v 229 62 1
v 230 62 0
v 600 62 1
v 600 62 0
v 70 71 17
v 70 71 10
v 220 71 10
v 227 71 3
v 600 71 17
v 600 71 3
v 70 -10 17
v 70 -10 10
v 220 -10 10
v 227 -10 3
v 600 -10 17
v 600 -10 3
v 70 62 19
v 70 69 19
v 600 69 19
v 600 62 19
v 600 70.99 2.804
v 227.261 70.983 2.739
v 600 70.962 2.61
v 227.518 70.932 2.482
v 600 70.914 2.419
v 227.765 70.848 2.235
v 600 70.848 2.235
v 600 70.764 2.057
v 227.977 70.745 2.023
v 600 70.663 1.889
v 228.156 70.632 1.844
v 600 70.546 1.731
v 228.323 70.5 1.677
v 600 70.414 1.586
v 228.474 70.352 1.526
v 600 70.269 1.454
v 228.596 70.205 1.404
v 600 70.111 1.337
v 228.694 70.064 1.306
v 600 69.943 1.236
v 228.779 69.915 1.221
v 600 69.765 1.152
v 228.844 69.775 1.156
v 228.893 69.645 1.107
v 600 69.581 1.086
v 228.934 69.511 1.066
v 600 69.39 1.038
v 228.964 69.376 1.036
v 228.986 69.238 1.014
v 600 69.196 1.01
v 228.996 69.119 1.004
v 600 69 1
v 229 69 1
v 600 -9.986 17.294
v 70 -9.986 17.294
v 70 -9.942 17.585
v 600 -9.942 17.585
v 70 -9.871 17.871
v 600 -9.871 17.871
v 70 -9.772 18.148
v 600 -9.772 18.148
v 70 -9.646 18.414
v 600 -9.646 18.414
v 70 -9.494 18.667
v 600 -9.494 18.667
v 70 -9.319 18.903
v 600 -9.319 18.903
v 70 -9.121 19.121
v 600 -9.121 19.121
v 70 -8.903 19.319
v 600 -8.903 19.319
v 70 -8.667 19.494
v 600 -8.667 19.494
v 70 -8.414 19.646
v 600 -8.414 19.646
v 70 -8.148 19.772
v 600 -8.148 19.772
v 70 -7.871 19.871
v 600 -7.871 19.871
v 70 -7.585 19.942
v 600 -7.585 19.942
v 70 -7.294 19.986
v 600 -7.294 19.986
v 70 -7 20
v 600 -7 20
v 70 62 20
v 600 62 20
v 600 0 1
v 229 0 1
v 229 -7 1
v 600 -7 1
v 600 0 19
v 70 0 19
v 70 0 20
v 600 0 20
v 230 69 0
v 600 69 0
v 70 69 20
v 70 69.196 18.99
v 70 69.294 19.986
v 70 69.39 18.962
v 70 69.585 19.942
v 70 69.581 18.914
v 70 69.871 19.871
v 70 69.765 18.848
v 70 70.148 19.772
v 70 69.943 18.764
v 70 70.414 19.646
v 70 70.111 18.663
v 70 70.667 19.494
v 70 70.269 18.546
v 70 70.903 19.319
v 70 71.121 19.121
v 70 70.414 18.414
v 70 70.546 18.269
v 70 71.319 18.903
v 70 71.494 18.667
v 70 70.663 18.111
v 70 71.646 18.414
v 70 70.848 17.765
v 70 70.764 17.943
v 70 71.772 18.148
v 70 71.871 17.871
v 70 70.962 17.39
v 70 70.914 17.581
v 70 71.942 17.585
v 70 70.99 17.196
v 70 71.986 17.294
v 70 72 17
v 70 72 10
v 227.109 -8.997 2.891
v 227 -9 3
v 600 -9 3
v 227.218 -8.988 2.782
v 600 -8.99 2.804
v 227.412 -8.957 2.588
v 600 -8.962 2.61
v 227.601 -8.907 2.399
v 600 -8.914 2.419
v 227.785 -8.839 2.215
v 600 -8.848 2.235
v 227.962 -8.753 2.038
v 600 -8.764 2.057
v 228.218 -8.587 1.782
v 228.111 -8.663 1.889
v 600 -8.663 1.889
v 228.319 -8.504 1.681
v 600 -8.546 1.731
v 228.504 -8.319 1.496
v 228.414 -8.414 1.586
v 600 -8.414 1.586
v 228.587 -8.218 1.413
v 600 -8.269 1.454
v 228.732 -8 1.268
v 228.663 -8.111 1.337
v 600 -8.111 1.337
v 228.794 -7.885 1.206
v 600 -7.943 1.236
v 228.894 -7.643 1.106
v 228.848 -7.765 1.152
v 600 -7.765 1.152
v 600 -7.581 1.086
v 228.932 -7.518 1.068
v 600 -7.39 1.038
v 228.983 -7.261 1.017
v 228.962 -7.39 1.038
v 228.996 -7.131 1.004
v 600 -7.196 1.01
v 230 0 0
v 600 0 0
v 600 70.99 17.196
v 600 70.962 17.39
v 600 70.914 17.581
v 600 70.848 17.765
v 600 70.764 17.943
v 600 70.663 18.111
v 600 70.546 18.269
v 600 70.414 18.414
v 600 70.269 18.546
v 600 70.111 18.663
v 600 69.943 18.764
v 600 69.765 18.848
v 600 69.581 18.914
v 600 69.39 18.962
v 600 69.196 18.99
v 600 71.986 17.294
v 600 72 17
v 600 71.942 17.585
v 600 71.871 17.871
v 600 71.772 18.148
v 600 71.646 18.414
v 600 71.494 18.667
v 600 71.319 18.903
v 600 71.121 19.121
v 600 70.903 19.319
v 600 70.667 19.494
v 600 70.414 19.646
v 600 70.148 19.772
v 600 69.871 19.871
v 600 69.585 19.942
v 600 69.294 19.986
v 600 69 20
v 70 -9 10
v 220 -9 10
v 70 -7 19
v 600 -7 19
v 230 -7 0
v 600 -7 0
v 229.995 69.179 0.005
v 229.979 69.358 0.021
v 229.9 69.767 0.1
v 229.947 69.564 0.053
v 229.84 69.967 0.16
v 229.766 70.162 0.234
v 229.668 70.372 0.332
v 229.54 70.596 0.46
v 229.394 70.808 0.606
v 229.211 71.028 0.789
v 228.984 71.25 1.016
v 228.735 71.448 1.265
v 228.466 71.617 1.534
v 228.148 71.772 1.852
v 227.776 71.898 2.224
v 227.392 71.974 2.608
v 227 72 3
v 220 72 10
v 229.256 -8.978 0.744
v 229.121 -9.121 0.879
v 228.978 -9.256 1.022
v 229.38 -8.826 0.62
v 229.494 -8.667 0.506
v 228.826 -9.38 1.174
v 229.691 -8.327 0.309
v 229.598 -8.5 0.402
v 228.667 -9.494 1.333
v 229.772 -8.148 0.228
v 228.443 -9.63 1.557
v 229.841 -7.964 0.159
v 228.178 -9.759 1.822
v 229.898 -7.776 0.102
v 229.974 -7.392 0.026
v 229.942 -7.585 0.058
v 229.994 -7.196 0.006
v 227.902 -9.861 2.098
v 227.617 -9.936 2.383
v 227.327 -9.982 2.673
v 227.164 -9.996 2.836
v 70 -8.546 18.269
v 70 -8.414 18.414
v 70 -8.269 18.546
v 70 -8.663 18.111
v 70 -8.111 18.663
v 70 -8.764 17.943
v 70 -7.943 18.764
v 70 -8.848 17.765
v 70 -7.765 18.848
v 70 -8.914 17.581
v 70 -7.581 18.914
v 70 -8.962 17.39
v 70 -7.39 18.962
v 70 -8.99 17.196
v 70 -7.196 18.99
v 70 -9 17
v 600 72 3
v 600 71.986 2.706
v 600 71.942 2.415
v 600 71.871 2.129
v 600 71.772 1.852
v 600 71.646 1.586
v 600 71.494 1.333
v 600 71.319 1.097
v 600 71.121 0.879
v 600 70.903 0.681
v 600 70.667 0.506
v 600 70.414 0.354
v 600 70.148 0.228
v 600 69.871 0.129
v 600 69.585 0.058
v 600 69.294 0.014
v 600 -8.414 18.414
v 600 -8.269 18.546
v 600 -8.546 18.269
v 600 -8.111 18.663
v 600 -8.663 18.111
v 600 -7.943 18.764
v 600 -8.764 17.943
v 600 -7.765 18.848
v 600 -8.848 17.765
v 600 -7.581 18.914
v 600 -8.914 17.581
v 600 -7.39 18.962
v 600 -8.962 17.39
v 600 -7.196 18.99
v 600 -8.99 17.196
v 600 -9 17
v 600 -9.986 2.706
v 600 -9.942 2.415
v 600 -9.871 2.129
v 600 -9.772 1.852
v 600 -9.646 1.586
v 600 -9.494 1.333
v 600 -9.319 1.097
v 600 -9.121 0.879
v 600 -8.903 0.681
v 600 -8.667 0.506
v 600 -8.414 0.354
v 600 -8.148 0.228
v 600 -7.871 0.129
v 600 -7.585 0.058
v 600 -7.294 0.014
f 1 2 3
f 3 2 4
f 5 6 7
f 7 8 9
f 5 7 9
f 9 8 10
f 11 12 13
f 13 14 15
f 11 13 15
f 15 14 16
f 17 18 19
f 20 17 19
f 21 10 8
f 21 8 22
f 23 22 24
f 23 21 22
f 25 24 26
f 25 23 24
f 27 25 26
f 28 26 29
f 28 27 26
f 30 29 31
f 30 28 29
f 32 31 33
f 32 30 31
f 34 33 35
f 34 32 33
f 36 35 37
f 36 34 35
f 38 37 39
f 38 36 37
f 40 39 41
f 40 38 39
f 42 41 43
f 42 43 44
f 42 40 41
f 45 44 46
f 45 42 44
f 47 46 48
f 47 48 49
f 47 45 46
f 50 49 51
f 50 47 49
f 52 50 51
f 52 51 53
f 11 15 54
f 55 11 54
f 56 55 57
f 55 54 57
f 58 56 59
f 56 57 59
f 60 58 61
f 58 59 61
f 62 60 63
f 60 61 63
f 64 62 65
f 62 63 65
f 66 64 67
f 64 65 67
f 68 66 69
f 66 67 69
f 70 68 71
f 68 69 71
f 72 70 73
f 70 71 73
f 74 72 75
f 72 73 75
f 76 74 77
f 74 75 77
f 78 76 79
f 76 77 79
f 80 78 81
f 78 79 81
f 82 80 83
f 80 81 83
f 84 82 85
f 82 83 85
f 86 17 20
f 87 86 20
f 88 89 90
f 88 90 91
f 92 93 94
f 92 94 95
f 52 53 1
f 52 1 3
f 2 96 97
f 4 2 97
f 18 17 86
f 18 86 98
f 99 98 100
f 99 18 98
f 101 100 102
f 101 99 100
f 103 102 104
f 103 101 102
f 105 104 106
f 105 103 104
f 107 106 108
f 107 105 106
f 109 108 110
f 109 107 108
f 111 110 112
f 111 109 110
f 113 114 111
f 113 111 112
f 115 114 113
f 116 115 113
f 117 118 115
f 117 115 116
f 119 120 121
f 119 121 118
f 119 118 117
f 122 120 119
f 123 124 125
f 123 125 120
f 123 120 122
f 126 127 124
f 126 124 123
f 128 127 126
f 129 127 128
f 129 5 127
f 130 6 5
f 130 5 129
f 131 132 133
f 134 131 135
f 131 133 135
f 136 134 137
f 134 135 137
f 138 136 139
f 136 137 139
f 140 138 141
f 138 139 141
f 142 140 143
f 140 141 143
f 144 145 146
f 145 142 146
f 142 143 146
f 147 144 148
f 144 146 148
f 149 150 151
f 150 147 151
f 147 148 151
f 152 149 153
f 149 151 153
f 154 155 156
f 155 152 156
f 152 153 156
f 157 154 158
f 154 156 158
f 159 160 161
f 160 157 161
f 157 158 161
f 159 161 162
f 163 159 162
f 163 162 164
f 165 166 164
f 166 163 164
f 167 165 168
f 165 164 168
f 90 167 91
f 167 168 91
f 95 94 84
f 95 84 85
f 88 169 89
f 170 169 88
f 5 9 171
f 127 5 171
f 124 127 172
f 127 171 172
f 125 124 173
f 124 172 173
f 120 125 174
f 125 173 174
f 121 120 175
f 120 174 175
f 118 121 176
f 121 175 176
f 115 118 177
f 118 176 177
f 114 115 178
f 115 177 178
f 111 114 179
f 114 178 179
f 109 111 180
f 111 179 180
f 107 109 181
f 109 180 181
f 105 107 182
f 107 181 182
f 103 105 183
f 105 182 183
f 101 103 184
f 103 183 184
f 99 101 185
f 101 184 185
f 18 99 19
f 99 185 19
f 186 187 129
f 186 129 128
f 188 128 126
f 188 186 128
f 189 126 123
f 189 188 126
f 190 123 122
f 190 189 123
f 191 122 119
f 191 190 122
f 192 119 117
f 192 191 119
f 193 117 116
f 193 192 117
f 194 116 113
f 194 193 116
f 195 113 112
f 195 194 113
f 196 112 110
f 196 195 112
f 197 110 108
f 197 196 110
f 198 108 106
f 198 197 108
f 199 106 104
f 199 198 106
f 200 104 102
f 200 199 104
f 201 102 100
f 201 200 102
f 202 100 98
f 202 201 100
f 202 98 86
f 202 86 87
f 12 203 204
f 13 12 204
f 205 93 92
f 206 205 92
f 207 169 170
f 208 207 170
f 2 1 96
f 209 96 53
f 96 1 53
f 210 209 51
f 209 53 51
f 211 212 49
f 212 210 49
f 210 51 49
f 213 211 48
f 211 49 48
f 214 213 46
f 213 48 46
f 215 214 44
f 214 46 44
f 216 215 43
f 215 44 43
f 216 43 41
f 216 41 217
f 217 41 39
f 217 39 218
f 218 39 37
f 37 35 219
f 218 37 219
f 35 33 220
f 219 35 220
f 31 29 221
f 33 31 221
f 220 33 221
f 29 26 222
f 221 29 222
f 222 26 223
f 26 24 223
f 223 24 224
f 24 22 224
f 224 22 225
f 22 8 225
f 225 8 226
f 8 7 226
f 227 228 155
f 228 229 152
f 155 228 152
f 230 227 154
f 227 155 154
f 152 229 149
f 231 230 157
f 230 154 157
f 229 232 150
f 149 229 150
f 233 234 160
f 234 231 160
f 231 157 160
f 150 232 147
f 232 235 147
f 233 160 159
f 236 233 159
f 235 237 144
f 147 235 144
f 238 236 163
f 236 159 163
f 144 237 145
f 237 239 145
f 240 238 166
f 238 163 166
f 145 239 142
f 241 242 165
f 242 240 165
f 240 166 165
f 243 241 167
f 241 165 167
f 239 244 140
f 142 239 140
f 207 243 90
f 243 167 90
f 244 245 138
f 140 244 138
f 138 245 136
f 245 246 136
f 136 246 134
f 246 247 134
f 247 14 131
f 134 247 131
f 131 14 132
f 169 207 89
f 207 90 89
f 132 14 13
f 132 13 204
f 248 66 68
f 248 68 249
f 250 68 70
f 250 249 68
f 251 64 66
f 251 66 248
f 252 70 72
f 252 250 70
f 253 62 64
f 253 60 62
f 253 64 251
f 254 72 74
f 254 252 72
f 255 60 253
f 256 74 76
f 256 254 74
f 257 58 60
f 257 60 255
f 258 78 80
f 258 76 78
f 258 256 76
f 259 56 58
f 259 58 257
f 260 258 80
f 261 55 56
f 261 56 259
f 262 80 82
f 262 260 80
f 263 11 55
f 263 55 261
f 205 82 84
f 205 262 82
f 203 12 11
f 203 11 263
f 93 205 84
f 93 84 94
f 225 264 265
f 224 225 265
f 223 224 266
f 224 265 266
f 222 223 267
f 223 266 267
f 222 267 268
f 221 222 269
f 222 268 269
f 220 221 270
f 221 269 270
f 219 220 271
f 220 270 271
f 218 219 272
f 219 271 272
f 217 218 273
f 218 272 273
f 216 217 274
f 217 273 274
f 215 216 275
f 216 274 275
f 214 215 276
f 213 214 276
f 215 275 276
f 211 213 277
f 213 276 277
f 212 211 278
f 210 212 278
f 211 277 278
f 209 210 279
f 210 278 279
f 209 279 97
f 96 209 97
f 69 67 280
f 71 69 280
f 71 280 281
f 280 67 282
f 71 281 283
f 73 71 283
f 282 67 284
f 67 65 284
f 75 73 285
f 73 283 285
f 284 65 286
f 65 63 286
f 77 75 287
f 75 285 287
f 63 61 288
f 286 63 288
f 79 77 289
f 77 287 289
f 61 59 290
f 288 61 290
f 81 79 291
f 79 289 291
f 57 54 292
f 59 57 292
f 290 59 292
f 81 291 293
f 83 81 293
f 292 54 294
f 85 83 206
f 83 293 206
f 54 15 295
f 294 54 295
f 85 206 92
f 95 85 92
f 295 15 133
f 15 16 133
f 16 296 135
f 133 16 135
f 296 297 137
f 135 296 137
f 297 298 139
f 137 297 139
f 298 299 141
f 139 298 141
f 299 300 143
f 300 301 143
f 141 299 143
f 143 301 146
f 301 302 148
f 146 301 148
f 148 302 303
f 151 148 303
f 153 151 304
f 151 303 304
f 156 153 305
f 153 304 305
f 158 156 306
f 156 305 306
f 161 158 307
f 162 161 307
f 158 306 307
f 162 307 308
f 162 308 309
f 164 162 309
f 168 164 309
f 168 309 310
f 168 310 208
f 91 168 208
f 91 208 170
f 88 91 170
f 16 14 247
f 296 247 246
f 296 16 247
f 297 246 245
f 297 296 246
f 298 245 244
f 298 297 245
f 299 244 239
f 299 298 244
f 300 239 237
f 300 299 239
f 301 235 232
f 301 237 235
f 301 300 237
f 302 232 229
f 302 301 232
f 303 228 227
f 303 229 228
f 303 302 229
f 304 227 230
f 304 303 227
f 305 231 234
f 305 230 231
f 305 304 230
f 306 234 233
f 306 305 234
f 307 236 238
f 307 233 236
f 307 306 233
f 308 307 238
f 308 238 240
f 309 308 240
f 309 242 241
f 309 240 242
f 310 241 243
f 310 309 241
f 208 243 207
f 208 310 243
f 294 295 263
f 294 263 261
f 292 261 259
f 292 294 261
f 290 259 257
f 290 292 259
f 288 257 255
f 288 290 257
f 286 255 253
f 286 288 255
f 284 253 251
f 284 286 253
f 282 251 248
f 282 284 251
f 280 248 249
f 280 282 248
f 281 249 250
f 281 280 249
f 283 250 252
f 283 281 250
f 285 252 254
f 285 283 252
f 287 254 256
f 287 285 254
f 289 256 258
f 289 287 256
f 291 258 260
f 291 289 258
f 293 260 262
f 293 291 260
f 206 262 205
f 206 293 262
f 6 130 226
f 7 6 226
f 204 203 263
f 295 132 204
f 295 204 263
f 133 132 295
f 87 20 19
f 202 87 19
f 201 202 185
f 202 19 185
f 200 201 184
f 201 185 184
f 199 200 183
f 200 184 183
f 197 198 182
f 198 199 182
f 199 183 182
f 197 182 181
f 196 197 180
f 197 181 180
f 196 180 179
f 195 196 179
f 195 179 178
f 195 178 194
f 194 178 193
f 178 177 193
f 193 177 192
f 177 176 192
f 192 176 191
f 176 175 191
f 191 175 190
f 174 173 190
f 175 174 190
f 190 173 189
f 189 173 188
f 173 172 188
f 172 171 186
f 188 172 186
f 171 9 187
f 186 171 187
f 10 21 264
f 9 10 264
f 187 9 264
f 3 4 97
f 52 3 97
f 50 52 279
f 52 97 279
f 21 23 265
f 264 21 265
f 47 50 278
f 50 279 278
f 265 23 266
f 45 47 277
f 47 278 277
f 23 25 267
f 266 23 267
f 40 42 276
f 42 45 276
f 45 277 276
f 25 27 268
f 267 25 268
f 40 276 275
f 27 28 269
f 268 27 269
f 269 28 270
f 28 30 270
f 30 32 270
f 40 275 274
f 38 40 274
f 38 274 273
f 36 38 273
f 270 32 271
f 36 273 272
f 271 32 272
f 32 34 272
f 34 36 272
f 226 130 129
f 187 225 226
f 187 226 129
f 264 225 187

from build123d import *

# Parameters (mm, degrees)
BOX194_W        = 150
BOX194_H        = 82
BOX194_DEPTH    = 10
BOX195_W        = 20
BOX195_H        = 82
BOX195_DEPTH    = 20
CHAMFER017_SIZE = 19
BOX211_W        = 70
BOX211_H        = 82
BOX211_DEPTH    = 20
BOX196_W        = 600
BOX196_H        = 10
BOX196_DEPTH    = 18
FILLET074_R     = 2
BOX197_W        = 600
BOX197_H        = 10
BOX197_DEPTH    = 18
FILLET073_R     = 2
BOX192_W        = 600
BOX192_H        = 10
BOX192_DEPTH    = 20
BOX193_W        = 600
BOX193_H        = 10
BOX193_DEPTH    = 20
FILLET075_R     = 3


with BuildPart() as box194:
    # Box194 → Box194 (new body)
    with BuildSketch(Plane(origin=(0, -10, 0), x_dir=(1, 0, 0), z_dir=(0, 0, 1))):
        with Locations((75, 41)):
            Rectangle(BOX194_W, BOX194_H)
    extrude(amount=BOX194_DEPTH)


with BuildPart() as fusion219:
    # Box195 → Box195 (new body)
    with BuildSketch(Plane(origin=(137, -10, -10), x_dir=(1, 0, 0), z_dir=(0, 0, 1))):
        with Locations((10, 41)):
            Rectangle(BOX195_W, BOX195_H)
    extrude(amount=BOX195_DEPTH)

    # Chamfer017
    chamfer017_edges = [fusion219.edges().sort_by_distance(p)[0] for p in [
        (157, 31, 10),
    ]]
    chamfer(chamfer017_edges, length=CHAMFER017_SIZE)


with BuildPart() as fusion219_1:
    # Chamfer017 placement: moved
    add(fusion219.part.moved(Location((12, 0, 0))))

    # Fusion219: union Box194
    add(box194.part)


with BuildPart() as fusion219_2:
    # Fusion219 placement: moved
    add(fusion219_1.part.moved(Location((70, 0, 0))))


with BuildPart() as fusion245:
    # Box211 → Box211 (new body)
    with BuildSketch(Plane(origin=(0, -10, 0), x_dir=(1, 0, 0), z_dir=(0, 0, 1))):
        with Locations((35, 41)):
            Rectangle(BOX211_W, BOX211_H)
    extrude(amount=BOX211_DEPTH)

    # Fusion245: union Fusion219
    add(fusion219_2.part)


with BuildPart() as fillet074:
    # Box196 → Box196 (new body)
    with BuildSketch(Plane(origin=(0, 1, 1), x_dir=(1, 0, 0), z_dir=(0, 0, 1))):
        with Locations((300, 5)):
            Rectangle(BOX196_W, BOX196_H)
    extrude(amount=BOX196_DEPTH)

    # Fillet074
    fillet074_edges = [fillet074.edges().sort_by_distance(p)[0] for p in [
        (300, 1, 1),
        (300, 1, 19),
    ]]
    fillet(fillet074_edges, radius=FILLET074_R)


with BuildPart() as fillet074_1:
    # Fillet074 placement: moved
    add(fillet074.part.moved(Location((0, -10, 0))))


with BuildPart() as fusion218:
    # Box197 → Box197 (new body)
    with BuildSketch(Plane(origin=(0, 51, 1), x_dir=(1, 0, 0), z_dir=(0, 0, 1))):
        with Locations((300, 5)):
            Rectangle(BOX197_W, BOX197_H)
    extrude(amount=BOX197_DEPTH)

    # Fillet073
    fillet073_edges = [fusion218.edges().sort_by_distance(p)[0] for p in [
        (300, 61, 1),
        (300, 61, 19),
    ]]
    fillet(fillet073_edges, radius=FILLET073_R)


with BuildPart() as fusion218_1:
    # Fillet073 placement: moved
    add(fusion218.part.moved(Location((0, 10, 0))))

    # Fusion218: union Fillet074
    add(fillet074_1.part)


with BuildPart() as box192:
    # Box192 → Box192 (new body)
    with BuildSketch(Plane(origin=(0, -10, 0), x_dir=(1, 0, 0), z_dir=(0, 0, 1))):
        with Locations((300, 5)):
            Rectangle(BOX192_W, BOX192_H)
    extrude(amount=BOX192_DEPTH)


with BuildPart() as frame_wide_metal:
    # Box193 → Box193 (new body)
    with BuildSketch(Plane(origin=(0, 62, 0), x_dir=(1, 0, 0), z_dir=(0, 0, 1))):
        with Locations((300, 5)):
            Rectangle(BOX193_W, BOX193_H)
    extrude(amount=BOX193_DEPTH)

    # Fusion216: union Box192
    add(box192.part)

    # Fillet075
    fillet075_edges = [frame_wide_metal.edges().sort_by_distance(p)[0] for p in [
        (300, 72, 0),
        (300, 72, 20),
        (300, -10, 0),
        (300, -10, 20),
    ]]
    fillet(fillet075_edges, radius=FILLET075_R)

    # Cut199: cut Fusion218
    add(fusion218_1.part, mode=Mode.SUBTRACT)

    # Cut221: cut Fusion245
    add(fusion245.part, mode=Mode.SUBTRACT)


solid = frame_wide_metal.part
